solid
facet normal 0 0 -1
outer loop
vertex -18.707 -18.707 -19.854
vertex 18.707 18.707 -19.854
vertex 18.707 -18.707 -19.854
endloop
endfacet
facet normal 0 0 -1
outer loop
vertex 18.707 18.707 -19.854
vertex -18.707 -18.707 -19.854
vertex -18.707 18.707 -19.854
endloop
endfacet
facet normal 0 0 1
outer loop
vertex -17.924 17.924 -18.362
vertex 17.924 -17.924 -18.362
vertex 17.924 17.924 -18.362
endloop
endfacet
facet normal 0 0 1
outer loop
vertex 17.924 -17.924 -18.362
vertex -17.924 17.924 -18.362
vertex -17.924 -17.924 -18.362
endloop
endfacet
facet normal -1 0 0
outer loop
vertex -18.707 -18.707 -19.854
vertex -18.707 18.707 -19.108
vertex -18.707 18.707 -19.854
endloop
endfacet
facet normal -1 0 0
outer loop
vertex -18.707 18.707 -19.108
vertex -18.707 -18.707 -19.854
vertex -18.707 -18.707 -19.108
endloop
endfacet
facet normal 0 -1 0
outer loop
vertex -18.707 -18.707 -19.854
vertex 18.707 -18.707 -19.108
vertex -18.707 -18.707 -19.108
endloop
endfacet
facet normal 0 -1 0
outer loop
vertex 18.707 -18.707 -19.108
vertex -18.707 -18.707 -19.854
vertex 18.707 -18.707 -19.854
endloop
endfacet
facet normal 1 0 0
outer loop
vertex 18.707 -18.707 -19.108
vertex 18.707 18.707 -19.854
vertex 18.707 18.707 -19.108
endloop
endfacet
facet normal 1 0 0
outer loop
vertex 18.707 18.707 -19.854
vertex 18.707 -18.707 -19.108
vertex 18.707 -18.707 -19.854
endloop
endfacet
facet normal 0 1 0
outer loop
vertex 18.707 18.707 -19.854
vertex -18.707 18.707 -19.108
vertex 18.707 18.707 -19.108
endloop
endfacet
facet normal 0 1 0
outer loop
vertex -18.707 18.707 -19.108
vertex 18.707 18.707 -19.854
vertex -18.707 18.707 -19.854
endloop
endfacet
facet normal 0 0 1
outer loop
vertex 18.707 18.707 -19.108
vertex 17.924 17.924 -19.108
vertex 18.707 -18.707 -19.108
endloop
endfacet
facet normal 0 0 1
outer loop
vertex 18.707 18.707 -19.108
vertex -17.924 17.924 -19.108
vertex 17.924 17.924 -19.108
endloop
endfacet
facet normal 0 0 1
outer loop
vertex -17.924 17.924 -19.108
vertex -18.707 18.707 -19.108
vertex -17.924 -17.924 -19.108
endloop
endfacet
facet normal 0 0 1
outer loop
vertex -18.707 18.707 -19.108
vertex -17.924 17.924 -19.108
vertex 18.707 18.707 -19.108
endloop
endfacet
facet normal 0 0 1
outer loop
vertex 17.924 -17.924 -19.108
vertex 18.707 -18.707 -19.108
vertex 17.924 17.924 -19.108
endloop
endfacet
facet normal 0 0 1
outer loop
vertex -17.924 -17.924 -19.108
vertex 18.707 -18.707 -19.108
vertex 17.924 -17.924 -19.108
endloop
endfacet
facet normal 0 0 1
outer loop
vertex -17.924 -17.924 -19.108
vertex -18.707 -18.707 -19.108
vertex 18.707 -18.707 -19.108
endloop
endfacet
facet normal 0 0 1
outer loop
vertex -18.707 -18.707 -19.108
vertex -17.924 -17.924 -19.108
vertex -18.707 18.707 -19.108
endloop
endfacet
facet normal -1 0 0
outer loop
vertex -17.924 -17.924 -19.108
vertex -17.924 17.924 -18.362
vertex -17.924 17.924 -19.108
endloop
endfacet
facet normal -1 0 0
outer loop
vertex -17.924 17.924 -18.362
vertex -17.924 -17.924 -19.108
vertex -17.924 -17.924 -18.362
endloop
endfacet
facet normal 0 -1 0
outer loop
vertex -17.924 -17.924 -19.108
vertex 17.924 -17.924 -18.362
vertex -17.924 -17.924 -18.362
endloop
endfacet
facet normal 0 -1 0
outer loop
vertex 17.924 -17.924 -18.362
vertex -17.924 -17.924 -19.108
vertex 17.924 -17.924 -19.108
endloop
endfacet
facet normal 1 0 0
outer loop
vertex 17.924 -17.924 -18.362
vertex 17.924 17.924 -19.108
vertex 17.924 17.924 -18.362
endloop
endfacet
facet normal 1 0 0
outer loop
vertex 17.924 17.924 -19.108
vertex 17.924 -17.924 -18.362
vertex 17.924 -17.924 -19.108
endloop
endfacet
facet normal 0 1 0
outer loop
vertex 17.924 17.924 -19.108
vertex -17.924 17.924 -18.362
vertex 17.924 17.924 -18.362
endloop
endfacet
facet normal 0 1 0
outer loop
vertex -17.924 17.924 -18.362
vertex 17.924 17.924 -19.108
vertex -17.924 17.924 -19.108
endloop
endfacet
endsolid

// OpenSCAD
arete = 39.908;
paroi = 1.5;
echelleReductionAjustementBouchon = 0.972;
r = 0.19; // résolution d'impression sur l'axe Z

//cube_creux();
//decoupe_bouchon();
//corps_ouvert();
bouchon();
//trou();

module corps_ouvert() {
    //rotate([180, 0, 0])
	difference() {
		cube_creux();
		decoupe_bouchon();
	}
}

module bouchon() {
    rotate([180, 0, 0])
	scale([echelleReductionAjustementBouchon, echelleReductionAjustementBouchon, 0.995])
	difference () {
        intersection() {
            cube_creux();
            decoupe_bouchon(echelleReductionAjustementBouchon);
        }
	}
}

module cube_creux() {
	difference() {
        cube(arete, center=true);
        cube(arete-2*paroi, center=true);
	}
}

module decoupe_bouchon(scale=1) {
    distance = arete/2;
	rotate([0,0,45]) translate([0,0,distance])
		cylinder(paroi, r=arete*0.682, $fn=4, center=true);
	rotate([0,0,45]) translate([0,0,distance-paroi])
		cylinder(paroi, r=(arete-paroi/2)*0.666, $fn=4, center=true);
}
